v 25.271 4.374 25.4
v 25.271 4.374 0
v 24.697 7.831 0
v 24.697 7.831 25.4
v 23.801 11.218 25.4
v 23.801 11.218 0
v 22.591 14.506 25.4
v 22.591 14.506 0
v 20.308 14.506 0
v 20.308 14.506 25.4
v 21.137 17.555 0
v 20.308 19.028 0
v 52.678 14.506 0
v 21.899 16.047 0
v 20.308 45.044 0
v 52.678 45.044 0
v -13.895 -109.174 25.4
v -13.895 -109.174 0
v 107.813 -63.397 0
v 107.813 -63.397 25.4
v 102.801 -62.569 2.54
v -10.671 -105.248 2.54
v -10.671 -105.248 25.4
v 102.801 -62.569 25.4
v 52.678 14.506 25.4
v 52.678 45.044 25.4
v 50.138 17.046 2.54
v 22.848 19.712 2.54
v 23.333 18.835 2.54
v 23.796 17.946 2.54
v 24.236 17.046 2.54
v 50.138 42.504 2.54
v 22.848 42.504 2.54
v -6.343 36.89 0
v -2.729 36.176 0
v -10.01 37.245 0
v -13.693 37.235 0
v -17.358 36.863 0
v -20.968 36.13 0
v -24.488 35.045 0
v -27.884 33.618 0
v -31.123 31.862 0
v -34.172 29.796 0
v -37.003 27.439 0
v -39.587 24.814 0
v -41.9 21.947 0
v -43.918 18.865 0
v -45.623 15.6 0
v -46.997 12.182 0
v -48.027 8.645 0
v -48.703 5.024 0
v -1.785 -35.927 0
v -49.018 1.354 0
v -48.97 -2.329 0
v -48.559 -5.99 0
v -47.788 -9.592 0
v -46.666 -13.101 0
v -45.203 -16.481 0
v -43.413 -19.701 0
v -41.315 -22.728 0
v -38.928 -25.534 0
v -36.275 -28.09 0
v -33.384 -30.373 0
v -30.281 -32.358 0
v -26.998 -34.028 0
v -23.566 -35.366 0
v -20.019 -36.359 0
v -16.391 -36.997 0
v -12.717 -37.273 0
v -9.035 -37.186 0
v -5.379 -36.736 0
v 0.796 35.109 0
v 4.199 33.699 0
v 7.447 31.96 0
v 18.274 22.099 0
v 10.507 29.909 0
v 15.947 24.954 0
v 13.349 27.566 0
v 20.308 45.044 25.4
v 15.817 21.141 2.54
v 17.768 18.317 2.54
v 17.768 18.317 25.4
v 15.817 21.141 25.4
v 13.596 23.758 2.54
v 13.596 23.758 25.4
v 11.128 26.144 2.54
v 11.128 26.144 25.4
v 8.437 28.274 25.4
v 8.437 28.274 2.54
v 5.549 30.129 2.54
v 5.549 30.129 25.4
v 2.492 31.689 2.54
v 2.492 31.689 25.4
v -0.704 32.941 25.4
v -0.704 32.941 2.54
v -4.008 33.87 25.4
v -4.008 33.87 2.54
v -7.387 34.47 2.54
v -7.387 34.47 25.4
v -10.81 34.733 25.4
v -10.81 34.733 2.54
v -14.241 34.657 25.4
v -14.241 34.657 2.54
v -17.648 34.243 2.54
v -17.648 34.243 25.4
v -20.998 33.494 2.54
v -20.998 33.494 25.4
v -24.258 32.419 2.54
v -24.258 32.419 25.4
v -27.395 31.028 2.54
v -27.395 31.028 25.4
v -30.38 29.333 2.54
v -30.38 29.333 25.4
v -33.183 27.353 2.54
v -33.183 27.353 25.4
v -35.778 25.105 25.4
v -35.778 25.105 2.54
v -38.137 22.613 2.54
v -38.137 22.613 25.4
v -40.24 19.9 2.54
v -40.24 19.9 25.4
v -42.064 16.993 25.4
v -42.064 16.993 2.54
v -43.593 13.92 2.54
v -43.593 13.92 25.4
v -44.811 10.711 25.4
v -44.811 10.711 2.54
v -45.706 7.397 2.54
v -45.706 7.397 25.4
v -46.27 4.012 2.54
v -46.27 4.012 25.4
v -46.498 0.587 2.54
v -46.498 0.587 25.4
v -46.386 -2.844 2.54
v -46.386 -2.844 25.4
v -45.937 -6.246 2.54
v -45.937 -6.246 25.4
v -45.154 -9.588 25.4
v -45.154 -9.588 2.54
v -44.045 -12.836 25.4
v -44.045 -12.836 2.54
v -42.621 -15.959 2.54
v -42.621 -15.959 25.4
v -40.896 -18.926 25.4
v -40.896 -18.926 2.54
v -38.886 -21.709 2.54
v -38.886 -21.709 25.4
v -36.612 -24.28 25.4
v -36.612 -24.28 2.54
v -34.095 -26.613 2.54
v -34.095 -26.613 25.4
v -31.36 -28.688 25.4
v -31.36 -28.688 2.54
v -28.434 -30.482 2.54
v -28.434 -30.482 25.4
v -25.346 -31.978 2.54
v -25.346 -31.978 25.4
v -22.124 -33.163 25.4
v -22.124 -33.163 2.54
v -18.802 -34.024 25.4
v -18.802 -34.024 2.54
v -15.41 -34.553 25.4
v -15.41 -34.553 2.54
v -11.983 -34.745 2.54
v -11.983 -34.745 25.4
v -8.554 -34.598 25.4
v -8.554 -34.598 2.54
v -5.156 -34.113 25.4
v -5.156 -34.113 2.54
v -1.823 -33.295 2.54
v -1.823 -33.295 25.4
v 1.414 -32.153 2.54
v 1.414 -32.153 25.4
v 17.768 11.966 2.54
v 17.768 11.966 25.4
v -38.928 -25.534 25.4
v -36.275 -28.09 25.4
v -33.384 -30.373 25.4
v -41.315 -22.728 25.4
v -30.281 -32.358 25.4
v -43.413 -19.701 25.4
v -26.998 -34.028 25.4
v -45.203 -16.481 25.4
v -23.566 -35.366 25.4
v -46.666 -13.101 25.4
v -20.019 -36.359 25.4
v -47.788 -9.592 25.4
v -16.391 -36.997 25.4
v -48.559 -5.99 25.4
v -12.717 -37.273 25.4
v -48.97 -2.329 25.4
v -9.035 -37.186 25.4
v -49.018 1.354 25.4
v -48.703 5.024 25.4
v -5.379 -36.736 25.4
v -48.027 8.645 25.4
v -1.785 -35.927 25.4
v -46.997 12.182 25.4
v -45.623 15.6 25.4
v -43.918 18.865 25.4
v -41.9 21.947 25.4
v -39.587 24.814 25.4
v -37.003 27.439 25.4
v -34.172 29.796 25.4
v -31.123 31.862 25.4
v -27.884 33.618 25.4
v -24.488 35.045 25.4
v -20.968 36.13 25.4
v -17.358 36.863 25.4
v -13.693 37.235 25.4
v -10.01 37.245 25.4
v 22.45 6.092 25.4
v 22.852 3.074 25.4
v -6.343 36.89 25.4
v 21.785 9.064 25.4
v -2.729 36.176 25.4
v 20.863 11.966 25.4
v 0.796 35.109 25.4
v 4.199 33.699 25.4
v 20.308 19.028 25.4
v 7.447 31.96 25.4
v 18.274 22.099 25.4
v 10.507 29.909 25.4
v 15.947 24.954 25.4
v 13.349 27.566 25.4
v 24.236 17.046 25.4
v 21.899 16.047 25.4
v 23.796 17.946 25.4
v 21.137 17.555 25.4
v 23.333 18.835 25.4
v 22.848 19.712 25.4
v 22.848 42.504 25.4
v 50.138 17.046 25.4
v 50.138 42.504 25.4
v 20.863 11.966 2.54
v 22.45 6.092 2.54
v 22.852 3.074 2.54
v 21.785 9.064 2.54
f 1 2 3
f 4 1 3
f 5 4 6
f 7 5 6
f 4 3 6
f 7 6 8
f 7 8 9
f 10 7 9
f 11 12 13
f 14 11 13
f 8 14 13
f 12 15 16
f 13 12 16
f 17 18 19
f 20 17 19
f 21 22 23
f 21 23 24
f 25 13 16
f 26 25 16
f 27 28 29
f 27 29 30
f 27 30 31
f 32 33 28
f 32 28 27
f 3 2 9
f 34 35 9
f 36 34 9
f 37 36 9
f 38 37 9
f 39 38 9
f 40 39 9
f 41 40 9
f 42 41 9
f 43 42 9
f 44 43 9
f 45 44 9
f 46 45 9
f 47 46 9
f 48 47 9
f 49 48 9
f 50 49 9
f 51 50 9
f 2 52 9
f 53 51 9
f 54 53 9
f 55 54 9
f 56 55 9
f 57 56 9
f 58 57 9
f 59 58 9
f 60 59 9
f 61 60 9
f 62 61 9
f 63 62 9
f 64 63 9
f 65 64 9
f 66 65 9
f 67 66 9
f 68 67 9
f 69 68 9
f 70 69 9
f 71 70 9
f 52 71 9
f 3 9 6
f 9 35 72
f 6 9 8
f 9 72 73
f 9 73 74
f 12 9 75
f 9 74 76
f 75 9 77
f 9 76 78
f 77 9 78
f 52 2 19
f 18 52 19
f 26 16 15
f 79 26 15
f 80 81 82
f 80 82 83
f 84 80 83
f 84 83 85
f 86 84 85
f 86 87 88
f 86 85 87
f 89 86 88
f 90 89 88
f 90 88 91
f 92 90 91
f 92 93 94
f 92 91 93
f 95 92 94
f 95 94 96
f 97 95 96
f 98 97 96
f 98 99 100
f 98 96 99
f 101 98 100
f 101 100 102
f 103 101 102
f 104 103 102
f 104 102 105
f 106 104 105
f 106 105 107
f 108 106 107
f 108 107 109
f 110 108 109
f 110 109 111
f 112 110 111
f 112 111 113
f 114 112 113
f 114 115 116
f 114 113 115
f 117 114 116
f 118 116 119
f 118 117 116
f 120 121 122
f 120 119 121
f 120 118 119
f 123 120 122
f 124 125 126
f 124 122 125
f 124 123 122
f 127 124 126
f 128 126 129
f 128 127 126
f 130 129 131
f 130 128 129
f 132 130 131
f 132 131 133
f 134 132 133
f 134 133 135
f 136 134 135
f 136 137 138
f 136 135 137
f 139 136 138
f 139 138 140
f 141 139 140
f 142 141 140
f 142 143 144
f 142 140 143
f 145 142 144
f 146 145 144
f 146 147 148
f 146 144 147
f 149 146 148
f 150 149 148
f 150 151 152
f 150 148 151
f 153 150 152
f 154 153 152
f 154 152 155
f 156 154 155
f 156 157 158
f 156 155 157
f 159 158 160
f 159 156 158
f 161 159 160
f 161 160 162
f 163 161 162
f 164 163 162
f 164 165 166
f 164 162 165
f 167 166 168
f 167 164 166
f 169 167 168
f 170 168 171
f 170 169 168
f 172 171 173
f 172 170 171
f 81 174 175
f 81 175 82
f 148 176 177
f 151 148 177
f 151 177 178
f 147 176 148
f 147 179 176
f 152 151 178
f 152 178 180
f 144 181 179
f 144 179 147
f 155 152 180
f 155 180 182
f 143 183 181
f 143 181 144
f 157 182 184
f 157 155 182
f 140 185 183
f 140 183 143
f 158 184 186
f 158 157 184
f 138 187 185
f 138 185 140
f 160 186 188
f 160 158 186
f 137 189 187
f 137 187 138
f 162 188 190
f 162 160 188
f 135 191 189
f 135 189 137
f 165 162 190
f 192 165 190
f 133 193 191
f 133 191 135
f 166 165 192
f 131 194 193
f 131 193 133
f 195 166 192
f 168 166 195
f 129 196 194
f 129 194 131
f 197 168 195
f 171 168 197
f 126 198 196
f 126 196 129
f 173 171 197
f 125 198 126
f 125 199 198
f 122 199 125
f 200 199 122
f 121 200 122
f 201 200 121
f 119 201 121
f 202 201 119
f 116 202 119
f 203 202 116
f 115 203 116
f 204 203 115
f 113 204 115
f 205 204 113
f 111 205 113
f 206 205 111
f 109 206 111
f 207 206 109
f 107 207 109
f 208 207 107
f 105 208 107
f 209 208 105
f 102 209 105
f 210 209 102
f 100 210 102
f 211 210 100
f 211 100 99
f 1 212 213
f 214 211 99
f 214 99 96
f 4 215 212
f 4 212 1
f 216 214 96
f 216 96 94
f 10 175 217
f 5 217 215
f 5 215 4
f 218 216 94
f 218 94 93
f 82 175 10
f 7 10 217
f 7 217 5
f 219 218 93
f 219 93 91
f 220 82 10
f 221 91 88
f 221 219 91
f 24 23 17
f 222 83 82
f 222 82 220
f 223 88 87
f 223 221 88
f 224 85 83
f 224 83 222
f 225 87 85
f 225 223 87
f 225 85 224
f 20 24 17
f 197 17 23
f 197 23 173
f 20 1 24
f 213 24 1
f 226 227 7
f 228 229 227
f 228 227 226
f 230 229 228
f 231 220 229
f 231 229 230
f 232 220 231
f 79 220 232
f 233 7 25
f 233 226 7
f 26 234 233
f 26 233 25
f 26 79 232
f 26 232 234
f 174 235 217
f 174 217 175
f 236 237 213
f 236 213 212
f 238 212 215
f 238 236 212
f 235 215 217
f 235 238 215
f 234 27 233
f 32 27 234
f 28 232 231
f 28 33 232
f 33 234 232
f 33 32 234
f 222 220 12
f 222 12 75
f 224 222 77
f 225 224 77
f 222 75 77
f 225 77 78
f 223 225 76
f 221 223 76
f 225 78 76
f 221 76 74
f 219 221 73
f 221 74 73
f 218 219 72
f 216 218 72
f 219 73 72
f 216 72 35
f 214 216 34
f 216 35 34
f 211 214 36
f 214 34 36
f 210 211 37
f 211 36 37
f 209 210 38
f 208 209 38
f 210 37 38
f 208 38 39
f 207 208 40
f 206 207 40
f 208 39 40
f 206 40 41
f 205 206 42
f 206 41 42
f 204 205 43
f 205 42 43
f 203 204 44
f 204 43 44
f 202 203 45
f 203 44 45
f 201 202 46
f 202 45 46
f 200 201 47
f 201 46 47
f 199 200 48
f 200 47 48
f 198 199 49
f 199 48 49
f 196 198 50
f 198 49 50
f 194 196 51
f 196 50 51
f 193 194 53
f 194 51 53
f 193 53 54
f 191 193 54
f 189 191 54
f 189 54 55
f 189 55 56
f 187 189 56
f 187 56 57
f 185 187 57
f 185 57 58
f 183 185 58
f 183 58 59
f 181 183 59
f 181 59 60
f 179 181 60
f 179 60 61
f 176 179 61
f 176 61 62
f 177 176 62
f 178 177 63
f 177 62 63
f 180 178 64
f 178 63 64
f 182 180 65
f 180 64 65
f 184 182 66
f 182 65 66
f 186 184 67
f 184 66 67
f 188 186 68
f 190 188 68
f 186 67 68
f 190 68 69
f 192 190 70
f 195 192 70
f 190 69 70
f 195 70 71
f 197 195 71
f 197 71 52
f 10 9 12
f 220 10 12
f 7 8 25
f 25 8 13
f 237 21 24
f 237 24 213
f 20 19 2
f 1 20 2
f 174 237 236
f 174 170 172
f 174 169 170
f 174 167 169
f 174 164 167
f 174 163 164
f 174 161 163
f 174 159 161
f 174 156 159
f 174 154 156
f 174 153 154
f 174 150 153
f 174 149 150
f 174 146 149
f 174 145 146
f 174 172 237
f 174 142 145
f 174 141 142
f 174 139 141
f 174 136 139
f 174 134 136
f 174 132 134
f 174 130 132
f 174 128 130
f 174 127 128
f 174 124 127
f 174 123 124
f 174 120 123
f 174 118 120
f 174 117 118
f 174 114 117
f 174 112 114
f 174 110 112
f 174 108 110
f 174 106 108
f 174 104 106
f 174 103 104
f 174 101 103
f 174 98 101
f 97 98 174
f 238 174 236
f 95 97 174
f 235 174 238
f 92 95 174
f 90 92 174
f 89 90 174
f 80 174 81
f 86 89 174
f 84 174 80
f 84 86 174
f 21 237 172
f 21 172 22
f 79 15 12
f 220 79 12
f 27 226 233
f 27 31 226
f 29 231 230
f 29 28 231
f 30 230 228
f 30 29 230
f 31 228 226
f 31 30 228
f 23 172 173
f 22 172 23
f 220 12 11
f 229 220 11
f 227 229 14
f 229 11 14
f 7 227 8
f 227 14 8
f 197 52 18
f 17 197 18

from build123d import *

# Parameters (mm, degrees)
F1_DEPTH = 25.4
F2_T     = -2.54
F2_2_T   = -2.54


with BuildPart() as f1:
    # F0 (on Top) → F1 (new body)
    with BuildSketch(Plane.XY):
        with BuildLine():
            ThreePointArc((20.307879895, 19.0276347573), (21.5263845302, 16.8054528694), (22.5911183123, 14.5056294277))
            Line((22.5911183123, 14.5056294277), (52.678335458, 14.5056294277))
            Line((52.678335458, 14.5056294277), (52.678335458, 45.0437963009))
            Line((52.678335458, 45.0437963009), (20.307879895, 45.0437963009))
            Line((20.307879895, 45.0437963009), (20.307879895, 19.0276347573))
        make_face()
    extrude(amount=F1_DEPTH)

    # F2#2
    f2_2_openings = [f1.faces().sort_by_distance(p)[0] for p in [
        (36.578547, 29.850824, 25.4),
    ]]
    offset(amount=F2_2_T, openings=f2_2_openings)


with BuildPart() as f1b:
    # F0 (on Top) → F1, piece 2 (new body)
    with BuildSketch(Plane.XY):
        with BuildLine():
            Line((7.3154635593, 19.116868731), (25.2709553989, 4.3744703169))
            ThreePointArc((25.2709553989, 4.3744703169), (24.2887477567, 9.534669543), (22.5911183123, 14.5056294277))
            Line((22.5911183123, 14.5056294277), (20.307879895, 14.5056294277))
            Line((20.307879895, 14.5056294277), (20.307879895, 19.0276347573))
            ThreePointArc((20.307879895, 19.0276347573), (-46.3519339996, 13.9076937512), (-1.7849945216, -35.9273590724))
            Line((-1.7849945216, -35.9273590724), (7.3154635593, 19.116868731))
        make_face()
        with BuildLine():
            ThreePointArc((25.2709553989, 4.3744703169), (25.4640266081, 2.1910213426), (25.5284579046, 0))
            ThreePointArc((25.5284579046, 0), (17.9247853773, -22.5654592982), (-1.7849945216, -35.9273590724))
            Line((-1.7849945216, -35.9273590724), (-13.8948485255, -109.1739535332))
            Line((-13.8948485255, -109.1739535332), (107.8134186701, -63.3972114887))
            Line((107.8134186701, -63.3972114887), (25.2709553989, 4.3744703169))
        make_face()
        with BuildLine():
            ThreePointArc((-1.7849945216, -35.9273590724), (17.9247853773, -22.5654592982), (25.5284579046, 0))
            ThreePointArc((25.5284579046, 0), (25.4640266081, 2.1910213426), (25.2709553989, 4.3744703169))
            Line((25.2709553989, 4.3744703169), (7.3154635593, 19.116868731))
            Line((7.3154635593, 19.116868731), (-1.7849945216, -35.9273590724))
        make_face()
    extrude(amount=F1_DEPTH)

    # F2
    f2_openings = [f1b.faces().sort_by_distance(p)[0] for p in [
        (17.131687, -33.902395, 25.4),
    ]]
    offset(amount=F2_T, openings=f2_openings, kind=Kind.INTERSECTION)


solid = Compound([f1.part, f1b.part])
